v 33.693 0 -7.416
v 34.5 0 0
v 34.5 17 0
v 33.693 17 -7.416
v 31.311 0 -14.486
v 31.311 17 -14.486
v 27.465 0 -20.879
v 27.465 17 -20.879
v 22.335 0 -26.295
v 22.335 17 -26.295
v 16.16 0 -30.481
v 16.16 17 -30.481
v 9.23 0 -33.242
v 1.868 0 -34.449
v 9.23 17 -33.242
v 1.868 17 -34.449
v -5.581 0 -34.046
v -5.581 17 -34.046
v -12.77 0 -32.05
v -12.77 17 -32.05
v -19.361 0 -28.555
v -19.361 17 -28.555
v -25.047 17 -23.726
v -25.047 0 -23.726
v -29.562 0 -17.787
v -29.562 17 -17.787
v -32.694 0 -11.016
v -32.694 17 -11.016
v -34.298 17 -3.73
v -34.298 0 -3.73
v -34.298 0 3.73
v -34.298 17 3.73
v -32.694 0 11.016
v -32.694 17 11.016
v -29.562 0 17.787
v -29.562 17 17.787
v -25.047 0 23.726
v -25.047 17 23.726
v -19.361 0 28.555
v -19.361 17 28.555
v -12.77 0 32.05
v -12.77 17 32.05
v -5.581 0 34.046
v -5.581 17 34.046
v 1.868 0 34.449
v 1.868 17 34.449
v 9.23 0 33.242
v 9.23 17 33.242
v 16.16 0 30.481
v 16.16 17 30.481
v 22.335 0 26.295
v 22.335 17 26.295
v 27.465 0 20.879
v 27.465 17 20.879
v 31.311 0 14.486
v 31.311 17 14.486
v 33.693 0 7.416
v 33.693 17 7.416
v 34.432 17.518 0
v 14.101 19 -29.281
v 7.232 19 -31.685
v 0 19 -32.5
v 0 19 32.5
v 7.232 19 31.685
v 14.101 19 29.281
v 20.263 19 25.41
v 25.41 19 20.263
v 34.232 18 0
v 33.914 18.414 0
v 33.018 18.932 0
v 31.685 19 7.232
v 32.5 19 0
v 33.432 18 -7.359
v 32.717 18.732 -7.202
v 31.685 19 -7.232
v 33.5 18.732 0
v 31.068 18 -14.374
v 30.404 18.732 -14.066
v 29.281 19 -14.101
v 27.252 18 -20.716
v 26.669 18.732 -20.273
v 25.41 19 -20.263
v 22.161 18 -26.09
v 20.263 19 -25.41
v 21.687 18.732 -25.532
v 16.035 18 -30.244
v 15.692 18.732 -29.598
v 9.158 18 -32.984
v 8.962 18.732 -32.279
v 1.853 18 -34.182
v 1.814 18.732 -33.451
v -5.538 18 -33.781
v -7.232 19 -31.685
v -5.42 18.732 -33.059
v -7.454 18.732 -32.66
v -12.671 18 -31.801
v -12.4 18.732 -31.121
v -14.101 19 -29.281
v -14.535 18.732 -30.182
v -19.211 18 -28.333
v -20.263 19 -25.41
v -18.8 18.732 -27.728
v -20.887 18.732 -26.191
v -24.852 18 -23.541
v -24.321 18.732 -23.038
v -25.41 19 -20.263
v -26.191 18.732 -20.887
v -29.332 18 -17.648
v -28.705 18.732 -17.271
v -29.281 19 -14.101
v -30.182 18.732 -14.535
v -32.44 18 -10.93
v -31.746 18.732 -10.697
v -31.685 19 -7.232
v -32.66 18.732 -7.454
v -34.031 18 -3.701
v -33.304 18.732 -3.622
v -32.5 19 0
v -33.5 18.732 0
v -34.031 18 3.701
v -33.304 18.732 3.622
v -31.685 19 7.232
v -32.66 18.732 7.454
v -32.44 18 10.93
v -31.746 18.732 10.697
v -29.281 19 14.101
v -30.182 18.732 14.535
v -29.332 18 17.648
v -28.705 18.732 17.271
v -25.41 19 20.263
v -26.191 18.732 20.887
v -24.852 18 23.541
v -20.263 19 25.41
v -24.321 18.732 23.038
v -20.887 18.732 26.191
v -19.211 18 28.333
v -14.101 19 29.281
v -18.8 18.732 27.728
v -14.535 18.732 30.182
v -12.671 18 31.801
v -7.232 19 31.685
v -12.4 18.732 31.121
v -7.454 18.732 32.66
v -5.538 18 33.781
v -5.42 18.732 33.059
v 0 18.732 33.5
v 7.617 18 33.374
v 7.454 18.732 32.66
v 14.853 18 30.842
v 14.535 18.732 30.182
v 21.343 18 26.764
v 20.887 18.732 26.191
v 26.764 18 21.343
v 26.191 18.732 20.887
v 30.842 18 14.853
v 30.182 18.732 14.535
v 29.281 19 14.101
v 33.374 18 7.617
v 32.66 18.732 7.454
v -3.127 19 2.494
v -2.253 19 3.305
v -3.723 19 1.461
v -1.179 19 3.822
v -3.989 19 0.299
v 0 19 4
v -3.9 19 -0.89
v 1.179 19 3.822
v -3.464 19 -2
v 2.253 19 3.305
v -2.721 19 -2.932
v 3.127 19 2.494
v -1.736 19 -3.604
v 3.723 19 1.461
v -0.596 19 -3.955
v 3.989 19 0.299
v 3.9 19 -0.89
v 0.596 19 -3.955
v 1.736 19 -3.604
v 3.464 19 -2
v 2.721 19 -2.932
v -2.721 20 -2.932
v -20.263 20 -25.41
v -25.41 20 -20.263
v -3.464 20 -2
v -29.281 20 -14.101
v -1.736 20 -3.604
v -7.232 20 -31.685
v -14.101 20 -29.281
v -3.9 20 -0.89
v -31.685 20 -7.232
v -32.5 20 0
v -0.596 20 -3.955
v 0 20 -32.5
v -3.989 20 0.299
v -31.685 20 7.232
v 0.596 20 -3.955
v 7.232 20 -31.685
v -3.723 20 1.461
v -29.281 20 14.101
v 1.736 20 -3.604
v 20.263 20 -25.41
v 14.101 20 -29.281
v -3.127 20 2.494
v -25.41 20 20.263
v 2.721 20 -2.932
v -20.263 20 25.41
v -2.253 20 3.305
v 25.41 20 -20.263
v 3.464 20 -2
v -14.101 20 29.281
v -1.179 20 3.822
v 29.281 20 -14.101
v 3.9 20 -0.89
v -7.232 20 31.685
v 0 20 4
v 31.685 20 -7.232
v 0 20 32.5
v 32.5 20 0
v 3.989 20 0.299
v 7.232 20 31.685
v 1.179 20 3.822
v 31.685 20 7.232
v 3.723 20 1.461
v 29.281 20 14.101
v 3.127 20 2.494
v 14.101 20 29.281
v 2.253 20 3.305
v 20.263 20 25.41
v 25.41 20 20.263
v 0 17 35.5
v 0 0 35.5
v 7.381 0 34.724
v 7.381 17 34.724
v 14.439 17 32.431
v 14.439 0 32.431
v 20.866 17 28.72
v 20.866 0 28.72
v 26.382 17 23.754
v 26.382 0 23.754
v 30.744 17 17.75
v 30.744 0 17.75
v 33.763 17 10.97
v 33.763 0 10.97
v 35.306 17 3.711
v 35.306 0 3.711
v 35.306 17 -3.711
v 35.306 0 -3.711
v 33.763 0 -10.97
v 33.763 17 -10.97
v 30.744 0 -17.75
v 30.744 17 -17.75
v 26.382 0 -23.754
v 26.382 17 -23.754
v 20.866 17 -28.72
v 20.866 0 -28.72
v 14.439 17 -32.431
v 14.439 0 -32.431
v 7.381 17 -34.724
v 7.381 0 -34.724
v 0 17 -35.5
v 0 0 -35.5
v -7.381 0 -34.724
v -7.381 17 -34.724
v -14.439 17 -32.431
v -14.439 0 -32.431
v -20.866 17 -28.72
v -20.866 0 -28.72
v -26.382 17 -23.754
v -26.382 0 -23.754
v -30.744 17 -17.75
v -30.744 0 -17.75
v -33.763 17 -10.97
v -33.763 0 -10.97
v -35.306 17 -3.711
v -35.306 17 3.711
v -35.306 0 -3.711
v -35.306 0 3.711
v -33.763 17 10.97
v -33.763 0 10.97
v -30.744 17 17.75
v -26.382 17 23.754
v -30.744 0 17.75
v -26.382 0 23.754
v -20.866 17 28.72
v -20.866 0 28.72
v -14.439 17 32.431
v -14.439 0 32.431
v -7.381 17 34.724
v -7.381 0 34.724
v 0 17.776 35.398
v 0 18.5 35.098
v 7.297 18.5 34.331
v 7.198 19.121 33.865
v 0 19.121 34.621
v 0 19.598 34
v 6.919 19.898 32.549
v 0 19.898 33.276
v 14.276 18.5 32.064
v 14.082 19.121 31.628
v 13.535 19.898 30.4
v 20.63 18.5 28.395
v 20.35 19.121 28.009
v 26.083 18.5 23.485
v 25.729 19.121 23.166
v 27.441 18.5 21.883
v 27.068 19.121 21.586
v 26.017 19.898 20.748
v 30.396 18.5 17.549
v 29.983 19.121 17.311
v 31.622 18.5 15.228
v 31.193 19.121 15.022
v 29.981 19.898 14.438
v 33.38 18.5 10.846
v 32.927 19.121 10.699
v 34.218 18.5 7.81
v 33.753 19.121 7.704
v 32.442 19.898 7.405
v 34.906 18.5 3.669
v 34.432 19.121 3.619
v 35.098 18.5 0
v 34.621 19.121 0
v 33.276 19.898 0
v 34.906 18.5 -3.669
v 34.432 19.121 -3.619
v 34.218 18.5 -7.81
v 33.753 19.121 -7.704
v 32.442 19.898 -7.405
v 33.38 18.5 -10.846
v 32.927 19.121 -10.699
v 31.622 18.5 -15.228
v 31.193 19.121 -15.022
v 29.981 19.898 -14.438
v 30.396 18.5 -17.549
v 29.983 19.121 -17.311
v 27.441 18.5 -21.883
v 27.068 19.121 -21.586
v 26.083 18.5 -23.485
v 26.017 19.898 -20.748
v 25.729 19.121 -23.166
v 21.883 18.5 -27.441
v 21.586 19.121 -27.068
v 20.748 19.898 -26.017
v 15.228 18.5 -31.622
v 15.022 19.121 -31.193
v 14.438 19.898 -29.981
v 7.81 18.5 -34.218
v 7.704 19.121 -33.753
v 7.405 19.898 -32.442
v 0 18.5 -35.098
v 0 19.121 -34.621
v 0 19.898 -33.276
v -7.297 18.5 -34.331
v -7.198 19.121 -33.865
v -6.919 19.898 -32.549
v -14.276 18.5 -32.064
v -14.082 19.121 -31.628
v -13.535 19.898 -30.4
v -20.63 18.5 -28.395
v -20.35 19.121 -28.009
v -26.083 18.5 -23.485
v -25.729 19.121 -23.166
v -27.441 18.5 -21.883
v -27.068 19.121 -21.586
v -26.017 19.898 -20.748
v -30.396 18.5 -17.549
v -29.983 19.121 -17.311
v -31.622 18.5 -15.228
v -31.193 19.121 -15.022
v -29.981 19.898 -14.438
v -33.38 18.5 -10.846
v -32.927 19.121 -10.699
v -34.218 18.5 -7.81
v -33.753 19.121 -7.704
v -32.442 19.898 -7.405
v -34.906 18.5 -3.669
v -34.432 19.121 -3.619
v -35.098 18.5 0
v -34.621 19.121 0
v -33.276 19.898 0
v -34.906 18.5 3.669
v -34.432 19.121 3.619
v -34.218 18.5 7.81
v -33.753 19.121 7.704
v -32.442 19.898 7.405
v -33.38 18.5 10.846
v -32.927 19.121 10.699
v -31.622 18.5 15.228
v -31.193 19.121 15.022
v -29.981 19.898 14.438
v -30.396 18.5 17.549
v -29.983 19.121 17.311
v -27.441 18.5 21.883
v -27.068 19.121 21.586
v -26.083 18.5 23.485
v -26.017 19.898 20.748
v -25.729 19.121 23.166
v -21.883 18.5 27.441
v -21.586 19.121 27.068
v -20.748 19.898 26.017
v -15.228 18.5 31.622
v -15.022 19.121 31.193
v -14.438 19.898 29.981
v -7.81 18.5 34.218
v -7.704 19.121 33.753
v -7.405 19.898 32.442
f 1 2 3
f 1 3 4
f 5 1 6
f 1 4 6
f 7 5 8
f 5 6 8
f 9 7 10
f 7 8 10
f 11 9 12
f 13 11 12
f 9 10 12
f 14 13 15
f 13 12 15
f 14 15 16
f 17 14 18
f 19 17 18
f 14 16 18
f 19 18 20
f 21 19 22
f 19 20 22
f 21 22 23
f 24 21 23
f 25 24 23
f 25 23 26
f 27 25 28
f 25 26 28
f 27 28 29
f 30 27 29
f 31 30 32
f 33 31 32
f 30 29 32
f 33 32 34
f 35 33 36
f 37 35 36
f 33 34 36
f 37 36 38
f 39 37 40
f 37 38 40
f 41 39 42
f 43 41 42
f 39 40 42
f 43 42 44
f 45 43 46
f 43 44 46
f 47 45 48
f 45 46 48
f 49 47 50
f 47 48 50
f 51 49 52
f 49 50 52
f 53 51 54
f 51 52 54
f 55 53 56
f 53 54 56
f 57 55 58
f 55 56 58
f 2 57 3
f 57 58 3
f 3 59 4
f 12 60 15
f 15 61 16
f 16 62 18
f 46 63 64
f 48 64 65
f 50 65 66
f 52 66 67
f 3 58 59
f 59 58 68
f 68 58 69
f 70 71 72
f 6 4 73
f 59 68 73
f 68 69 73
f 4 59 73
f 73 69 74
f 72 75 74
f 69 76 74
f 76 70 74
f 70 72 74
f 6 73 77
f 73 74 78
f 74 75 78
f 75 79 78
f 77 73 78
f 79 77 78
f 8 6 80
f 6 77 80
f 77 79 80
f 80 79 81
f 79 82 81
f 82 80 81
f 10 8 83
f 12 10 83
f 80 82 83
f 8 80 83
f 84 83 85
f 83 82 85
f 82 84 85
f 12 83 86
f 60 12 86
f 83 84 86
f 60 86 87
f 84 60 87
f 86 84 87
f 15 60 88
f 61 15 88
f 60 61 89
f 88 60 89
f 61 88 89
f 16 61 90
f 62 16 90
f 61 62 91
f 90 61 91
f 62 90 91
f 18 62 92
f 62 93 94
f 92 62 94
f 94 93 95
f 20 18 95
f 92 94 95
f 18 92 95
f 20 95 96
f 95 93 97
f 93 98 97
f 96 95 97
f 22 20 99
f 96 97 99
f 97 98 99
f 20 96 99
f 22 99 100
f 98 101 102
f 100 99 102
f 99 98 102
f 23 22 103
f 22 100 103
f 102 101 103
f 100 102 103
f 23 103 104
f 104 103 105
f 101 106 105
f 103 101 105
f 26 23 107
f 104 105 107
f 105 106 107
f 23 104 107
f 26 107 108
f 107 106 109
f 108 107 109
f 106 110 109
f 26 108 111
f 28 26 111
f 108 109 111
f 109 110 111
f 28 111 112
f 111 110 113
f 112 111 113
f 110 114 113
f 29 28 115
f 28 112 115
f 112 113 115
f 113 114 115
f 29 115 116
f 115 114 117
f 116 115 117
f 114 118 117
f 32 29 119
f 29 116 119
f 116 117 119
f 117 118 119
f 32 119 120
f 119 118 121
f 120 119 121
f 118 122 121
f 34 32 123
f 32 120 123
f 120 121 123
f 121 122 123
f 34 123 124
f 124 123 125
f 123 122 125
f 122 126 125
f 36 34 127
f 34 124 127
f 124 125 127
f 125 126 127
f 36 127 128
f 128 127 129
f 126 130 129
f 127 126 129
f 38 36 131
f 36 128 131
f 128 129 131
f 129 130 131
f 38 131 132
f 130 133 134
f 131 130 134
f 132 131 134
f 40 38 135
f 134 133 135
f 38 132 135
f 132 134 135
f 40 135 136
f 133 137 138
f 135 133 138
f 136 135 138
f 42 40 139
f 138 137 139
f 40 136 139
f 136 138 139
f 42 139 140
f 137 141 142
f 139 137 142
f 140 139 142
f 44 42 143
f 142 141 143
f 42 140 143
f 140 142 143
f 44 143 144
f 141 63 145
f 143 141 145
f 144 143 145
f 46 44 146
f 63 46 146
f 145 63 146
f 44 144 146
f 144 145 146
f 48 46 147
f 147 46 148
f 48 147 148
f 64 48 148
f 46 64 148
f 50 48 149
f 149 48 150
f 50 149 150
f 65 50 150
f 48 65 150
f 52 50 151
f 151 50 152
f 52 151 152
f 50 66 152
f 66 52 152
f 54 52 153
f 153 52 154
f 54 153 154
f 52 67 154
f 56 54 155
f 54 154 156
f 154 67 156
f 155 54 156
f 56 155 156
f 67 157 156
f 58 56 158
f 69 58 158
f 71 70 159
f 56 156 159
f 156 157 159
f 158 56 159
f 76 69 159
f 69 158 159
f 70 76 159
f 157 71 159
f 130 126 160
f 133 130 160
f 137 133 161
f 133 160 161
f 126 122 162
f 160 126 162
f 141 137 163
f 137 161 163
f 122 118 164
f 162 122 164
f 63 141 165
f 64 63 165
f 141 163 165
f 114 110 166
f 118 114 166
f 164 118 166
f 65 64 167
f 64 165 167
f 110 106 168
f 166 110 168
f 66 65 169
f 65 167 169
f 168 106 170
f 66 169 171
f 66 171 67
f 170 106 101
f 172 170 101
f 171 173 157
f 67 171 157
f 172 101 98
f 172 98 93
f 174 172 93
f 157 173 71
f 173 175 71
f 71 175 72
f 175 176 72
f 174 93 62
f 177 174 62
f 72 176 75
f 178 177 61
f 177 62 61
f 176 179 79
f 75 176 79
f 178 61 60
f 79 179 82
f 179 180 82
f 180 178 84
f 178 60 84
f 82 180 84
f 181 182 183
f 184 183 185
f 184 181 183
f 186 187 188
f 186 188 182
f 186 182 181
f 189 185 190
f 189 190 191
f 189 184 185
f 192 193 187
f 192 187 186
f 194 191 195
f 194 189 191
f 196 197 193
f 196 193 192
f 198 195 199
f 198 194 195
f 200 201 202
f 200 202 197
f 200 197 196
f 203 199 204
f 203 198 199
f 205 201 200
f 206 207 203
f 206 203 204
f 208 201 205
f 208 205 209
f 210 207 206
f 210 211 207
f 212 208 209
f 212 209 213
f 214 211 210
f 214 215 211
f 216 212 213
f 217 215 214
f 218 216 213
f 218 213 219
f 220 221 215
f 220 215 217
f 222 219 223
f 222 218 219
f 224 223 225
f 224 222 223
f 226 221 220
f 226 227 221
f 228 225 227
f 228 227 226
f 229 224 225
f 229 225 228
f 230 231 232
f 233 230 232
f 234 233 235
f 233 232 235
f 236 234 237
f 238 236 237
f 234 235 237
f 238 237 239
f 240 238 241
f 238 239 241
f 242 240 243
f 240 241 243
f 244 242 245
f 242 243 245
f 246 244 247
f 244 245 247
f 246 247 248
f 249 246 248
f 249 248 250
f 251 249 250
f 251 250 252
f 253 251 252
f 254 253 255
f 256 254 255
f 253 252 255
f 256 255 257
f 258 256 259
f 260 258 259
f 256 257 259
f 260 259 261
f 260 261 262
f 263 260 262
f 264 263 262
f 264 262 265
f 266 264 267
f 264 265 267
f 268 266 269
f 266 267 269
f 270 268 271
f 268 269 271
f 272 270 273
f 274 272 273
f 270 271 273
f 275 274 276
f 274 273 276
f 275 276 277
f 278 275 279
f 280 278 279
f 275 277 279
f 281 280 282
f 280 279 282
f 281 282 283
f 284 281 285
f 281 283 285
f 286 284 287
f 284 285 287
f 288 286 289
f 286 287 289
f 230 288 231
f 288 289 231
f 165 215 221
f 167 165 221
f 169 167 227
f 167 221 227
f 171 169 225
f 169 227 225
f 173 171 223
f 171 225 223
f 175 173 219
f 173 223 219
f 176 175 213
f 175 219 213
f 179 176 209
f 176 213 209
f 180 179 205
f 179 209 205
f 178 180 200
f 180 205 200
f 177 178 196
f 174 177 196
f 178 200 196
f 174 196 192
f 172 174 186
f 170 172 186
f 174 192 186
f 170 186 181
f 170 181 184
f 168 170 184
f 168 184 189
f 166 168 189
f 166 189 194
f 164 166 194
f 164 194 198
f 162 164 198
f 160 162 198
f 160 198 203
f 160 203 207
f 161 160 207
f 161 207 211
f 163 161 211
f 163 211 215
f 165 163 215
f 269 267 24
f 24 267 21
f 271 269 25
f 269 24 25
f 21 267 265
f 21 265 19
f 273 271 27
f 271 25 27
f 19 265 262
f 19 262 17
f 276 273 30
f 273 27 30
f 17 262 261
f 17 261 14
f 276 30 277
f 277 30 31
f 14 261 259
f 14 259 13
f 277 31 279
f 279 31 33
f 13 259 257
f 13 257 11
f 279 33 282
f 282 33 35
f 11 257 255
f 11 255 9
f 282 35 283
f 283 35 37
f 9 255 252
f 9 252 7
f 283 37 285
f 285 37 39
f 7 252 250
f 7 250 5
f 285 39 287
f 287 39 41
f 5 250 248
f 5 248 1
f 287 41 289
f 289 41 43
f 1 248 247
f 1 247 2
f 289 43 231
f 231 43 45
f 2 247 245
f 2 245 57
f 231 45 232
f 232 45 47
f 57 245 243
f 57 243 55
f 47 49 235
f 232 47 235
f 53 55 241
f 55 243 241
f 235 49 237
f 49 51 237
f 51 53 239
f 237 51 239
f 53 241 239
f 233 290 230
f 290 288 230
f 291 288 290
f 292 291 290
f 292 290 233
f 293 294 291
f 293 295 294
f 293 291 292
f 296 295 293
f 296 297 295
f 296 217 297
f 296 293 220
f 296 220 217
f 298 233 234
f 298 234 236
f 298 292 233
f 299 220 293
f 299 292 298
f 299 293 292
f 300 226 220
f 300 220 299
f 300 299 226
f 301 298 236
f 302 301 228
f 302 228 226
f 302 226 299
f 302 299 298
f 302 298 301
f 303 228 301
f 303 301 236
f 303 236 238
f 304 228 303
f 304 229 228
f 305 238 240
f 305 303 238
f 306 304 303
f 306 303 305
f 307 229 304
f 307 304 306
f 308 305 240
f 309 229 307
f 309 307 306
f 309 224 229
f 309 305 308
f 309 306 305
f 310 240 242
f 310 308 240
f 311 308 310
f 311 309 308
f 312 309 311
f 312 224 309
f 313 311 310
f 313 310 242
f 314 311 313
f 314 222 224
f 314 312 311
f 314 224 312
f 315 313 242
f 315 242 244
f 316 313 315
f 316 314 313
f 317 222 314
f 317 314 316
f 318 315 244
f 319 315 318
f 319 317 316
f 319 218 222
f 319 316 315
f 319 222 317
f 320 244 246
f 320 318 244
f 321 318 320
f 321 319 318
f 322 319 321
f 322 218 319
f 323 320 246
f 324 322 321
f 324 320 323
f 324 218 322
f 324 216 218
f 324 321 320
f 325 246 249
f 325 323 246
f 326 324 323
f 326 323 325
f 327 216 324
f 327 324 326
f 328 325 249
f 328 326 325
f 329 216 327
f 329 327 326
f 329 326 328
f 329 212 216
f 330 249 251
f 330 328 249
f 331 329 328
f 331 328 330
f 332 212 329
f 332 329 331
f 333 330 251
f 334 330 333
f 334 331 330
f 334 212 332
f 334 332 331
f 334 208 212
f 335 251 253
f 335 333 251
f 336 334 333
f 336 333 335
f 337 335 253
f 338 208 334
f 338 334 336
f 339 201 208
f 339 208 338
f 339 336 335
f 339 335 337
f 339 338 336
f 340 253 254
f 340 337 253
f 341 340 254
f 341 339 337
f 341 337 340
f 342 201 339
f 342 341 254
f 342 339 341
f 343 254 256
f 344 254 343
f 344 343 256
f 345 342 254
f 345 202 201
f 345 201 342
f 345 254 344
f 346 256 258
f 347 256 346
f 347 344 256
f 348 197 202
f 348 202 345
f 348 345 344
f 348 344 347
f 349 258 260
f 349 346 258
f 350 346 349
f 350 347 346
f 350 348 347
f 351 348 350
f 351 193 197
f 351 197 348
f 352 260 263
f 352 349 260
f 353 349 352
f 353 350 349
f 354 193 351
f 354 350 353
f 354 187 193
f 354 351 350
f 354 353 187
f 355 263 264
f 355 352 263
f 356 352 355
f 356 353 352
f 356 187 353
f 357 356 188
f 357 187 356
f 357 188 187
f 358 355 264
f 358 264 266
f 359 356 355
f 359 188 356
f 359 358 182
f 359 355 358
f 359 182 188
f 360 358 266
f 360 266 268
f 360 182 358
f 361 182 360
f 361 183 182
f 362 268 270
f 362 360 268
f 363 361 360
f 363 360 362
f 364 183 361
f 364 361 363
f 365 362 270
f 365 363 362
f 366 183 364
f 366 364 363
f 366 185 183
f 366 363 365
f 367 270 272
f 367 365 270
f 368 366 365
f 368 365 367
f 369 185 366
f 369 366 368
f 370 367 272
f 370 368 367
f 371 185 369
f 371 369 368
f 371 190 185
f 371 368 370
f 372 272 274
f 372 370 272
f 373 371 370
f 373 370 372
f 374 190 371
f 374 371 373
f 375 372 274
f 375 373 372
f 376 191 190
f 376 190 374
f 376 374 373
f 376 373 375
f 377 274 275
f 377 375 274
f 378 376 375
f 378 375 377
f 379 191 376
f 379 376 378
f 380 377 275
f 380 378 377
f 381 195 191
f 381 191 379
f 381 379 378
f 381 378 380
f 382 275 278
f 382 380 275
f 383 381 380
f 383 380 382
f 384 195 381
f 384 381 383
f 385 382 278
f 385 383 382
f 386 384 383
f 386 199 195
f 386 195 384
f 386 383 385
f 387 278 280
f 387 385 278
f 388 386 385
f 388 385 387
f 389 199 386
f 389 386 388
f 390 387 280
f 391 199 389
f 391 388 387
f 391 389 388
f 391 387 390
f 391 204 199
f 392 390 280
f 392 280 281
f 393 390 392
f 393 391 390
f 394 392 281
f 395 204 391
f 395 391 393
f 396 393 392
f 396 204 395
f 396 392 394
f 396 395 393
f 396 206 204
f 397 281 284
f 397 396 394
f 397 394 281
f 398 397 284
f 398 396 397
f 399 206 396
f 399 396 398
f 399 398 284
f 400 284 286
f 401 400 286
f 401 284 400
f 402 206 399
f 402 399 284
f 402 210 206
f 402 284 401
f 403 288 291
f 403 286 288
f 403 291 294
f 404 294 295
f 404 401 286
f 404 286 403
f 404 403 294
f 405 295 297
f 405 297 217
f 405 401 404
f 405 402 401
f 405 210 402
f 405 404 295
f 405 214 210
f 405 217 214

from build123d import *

# Parameters (mm, degrees)
ESQUISSE1_R             = 35.5
BOSS_EXTRU_1_DEPTH      = 20
CONG_1_R                = 3
ESQUISSE2_R             = 4
ENL_V_MAT_EXTRU_1_DEPTH = 2


# Read off the part's stored shape, not the designer's step: Coque1
with BuildPart() as part:
    # Esquisse1 → Boss.-Extru.1 (new body)
    with BuildSketch(Plane(origin=(0, 0, 0), x_dir=(1, 0, 0), z_dir=(0, 1, 0))):
        with Locations(Location((0, 0, 0), (0, 0, 270))):
            Circle(ESQUISSE1_R)
    extrude(amount=BOSS_EXTRU_1_DEPTH)

    # Congé1
    cong_1_edges = [part.edges().sort_by_distance(p)[0] for p in [
        (0, 20, -35.5),
    ]]
    fillet(cong_1_edges, radius=CONG_1_R)

    # Coque1 outline → Coque1 (revolve, cut)
    with BuildSketch(Plane.XY):
        with BuildLine():
            Line((34.5, 0), (34.5, 17))
            ThreePointArc((34.5, 17), (33.914213562, 18.414213562), (32.5, 19))
            Line((32.5, 19), (0, 19))
            Line((0, 19), (0, 0))
            Line((0, 0), (34.5, 0))
        make_face()
    revolve(axis=Axis((0, 0, 0), (0, 1, 0)), mode=Mode.SUBTRACT)

    # Esquisse2 → Enlèv. mat.-Extru.1 (cut)
    with BuildSketch(Plane(origin=(0, 20, 0), x_dir=(1, 0, 0), z_dir=(0, 1, 0))):
        with Locations(Location((0, 0, 0), (0, 0, 270))):
            Circle(ESQUISSE2_R)
    extrude(amount=-ENL_V_MAT_EXTRU_1_DEPTH, mode=Mode.SUBTRACT)


solid = part.part
